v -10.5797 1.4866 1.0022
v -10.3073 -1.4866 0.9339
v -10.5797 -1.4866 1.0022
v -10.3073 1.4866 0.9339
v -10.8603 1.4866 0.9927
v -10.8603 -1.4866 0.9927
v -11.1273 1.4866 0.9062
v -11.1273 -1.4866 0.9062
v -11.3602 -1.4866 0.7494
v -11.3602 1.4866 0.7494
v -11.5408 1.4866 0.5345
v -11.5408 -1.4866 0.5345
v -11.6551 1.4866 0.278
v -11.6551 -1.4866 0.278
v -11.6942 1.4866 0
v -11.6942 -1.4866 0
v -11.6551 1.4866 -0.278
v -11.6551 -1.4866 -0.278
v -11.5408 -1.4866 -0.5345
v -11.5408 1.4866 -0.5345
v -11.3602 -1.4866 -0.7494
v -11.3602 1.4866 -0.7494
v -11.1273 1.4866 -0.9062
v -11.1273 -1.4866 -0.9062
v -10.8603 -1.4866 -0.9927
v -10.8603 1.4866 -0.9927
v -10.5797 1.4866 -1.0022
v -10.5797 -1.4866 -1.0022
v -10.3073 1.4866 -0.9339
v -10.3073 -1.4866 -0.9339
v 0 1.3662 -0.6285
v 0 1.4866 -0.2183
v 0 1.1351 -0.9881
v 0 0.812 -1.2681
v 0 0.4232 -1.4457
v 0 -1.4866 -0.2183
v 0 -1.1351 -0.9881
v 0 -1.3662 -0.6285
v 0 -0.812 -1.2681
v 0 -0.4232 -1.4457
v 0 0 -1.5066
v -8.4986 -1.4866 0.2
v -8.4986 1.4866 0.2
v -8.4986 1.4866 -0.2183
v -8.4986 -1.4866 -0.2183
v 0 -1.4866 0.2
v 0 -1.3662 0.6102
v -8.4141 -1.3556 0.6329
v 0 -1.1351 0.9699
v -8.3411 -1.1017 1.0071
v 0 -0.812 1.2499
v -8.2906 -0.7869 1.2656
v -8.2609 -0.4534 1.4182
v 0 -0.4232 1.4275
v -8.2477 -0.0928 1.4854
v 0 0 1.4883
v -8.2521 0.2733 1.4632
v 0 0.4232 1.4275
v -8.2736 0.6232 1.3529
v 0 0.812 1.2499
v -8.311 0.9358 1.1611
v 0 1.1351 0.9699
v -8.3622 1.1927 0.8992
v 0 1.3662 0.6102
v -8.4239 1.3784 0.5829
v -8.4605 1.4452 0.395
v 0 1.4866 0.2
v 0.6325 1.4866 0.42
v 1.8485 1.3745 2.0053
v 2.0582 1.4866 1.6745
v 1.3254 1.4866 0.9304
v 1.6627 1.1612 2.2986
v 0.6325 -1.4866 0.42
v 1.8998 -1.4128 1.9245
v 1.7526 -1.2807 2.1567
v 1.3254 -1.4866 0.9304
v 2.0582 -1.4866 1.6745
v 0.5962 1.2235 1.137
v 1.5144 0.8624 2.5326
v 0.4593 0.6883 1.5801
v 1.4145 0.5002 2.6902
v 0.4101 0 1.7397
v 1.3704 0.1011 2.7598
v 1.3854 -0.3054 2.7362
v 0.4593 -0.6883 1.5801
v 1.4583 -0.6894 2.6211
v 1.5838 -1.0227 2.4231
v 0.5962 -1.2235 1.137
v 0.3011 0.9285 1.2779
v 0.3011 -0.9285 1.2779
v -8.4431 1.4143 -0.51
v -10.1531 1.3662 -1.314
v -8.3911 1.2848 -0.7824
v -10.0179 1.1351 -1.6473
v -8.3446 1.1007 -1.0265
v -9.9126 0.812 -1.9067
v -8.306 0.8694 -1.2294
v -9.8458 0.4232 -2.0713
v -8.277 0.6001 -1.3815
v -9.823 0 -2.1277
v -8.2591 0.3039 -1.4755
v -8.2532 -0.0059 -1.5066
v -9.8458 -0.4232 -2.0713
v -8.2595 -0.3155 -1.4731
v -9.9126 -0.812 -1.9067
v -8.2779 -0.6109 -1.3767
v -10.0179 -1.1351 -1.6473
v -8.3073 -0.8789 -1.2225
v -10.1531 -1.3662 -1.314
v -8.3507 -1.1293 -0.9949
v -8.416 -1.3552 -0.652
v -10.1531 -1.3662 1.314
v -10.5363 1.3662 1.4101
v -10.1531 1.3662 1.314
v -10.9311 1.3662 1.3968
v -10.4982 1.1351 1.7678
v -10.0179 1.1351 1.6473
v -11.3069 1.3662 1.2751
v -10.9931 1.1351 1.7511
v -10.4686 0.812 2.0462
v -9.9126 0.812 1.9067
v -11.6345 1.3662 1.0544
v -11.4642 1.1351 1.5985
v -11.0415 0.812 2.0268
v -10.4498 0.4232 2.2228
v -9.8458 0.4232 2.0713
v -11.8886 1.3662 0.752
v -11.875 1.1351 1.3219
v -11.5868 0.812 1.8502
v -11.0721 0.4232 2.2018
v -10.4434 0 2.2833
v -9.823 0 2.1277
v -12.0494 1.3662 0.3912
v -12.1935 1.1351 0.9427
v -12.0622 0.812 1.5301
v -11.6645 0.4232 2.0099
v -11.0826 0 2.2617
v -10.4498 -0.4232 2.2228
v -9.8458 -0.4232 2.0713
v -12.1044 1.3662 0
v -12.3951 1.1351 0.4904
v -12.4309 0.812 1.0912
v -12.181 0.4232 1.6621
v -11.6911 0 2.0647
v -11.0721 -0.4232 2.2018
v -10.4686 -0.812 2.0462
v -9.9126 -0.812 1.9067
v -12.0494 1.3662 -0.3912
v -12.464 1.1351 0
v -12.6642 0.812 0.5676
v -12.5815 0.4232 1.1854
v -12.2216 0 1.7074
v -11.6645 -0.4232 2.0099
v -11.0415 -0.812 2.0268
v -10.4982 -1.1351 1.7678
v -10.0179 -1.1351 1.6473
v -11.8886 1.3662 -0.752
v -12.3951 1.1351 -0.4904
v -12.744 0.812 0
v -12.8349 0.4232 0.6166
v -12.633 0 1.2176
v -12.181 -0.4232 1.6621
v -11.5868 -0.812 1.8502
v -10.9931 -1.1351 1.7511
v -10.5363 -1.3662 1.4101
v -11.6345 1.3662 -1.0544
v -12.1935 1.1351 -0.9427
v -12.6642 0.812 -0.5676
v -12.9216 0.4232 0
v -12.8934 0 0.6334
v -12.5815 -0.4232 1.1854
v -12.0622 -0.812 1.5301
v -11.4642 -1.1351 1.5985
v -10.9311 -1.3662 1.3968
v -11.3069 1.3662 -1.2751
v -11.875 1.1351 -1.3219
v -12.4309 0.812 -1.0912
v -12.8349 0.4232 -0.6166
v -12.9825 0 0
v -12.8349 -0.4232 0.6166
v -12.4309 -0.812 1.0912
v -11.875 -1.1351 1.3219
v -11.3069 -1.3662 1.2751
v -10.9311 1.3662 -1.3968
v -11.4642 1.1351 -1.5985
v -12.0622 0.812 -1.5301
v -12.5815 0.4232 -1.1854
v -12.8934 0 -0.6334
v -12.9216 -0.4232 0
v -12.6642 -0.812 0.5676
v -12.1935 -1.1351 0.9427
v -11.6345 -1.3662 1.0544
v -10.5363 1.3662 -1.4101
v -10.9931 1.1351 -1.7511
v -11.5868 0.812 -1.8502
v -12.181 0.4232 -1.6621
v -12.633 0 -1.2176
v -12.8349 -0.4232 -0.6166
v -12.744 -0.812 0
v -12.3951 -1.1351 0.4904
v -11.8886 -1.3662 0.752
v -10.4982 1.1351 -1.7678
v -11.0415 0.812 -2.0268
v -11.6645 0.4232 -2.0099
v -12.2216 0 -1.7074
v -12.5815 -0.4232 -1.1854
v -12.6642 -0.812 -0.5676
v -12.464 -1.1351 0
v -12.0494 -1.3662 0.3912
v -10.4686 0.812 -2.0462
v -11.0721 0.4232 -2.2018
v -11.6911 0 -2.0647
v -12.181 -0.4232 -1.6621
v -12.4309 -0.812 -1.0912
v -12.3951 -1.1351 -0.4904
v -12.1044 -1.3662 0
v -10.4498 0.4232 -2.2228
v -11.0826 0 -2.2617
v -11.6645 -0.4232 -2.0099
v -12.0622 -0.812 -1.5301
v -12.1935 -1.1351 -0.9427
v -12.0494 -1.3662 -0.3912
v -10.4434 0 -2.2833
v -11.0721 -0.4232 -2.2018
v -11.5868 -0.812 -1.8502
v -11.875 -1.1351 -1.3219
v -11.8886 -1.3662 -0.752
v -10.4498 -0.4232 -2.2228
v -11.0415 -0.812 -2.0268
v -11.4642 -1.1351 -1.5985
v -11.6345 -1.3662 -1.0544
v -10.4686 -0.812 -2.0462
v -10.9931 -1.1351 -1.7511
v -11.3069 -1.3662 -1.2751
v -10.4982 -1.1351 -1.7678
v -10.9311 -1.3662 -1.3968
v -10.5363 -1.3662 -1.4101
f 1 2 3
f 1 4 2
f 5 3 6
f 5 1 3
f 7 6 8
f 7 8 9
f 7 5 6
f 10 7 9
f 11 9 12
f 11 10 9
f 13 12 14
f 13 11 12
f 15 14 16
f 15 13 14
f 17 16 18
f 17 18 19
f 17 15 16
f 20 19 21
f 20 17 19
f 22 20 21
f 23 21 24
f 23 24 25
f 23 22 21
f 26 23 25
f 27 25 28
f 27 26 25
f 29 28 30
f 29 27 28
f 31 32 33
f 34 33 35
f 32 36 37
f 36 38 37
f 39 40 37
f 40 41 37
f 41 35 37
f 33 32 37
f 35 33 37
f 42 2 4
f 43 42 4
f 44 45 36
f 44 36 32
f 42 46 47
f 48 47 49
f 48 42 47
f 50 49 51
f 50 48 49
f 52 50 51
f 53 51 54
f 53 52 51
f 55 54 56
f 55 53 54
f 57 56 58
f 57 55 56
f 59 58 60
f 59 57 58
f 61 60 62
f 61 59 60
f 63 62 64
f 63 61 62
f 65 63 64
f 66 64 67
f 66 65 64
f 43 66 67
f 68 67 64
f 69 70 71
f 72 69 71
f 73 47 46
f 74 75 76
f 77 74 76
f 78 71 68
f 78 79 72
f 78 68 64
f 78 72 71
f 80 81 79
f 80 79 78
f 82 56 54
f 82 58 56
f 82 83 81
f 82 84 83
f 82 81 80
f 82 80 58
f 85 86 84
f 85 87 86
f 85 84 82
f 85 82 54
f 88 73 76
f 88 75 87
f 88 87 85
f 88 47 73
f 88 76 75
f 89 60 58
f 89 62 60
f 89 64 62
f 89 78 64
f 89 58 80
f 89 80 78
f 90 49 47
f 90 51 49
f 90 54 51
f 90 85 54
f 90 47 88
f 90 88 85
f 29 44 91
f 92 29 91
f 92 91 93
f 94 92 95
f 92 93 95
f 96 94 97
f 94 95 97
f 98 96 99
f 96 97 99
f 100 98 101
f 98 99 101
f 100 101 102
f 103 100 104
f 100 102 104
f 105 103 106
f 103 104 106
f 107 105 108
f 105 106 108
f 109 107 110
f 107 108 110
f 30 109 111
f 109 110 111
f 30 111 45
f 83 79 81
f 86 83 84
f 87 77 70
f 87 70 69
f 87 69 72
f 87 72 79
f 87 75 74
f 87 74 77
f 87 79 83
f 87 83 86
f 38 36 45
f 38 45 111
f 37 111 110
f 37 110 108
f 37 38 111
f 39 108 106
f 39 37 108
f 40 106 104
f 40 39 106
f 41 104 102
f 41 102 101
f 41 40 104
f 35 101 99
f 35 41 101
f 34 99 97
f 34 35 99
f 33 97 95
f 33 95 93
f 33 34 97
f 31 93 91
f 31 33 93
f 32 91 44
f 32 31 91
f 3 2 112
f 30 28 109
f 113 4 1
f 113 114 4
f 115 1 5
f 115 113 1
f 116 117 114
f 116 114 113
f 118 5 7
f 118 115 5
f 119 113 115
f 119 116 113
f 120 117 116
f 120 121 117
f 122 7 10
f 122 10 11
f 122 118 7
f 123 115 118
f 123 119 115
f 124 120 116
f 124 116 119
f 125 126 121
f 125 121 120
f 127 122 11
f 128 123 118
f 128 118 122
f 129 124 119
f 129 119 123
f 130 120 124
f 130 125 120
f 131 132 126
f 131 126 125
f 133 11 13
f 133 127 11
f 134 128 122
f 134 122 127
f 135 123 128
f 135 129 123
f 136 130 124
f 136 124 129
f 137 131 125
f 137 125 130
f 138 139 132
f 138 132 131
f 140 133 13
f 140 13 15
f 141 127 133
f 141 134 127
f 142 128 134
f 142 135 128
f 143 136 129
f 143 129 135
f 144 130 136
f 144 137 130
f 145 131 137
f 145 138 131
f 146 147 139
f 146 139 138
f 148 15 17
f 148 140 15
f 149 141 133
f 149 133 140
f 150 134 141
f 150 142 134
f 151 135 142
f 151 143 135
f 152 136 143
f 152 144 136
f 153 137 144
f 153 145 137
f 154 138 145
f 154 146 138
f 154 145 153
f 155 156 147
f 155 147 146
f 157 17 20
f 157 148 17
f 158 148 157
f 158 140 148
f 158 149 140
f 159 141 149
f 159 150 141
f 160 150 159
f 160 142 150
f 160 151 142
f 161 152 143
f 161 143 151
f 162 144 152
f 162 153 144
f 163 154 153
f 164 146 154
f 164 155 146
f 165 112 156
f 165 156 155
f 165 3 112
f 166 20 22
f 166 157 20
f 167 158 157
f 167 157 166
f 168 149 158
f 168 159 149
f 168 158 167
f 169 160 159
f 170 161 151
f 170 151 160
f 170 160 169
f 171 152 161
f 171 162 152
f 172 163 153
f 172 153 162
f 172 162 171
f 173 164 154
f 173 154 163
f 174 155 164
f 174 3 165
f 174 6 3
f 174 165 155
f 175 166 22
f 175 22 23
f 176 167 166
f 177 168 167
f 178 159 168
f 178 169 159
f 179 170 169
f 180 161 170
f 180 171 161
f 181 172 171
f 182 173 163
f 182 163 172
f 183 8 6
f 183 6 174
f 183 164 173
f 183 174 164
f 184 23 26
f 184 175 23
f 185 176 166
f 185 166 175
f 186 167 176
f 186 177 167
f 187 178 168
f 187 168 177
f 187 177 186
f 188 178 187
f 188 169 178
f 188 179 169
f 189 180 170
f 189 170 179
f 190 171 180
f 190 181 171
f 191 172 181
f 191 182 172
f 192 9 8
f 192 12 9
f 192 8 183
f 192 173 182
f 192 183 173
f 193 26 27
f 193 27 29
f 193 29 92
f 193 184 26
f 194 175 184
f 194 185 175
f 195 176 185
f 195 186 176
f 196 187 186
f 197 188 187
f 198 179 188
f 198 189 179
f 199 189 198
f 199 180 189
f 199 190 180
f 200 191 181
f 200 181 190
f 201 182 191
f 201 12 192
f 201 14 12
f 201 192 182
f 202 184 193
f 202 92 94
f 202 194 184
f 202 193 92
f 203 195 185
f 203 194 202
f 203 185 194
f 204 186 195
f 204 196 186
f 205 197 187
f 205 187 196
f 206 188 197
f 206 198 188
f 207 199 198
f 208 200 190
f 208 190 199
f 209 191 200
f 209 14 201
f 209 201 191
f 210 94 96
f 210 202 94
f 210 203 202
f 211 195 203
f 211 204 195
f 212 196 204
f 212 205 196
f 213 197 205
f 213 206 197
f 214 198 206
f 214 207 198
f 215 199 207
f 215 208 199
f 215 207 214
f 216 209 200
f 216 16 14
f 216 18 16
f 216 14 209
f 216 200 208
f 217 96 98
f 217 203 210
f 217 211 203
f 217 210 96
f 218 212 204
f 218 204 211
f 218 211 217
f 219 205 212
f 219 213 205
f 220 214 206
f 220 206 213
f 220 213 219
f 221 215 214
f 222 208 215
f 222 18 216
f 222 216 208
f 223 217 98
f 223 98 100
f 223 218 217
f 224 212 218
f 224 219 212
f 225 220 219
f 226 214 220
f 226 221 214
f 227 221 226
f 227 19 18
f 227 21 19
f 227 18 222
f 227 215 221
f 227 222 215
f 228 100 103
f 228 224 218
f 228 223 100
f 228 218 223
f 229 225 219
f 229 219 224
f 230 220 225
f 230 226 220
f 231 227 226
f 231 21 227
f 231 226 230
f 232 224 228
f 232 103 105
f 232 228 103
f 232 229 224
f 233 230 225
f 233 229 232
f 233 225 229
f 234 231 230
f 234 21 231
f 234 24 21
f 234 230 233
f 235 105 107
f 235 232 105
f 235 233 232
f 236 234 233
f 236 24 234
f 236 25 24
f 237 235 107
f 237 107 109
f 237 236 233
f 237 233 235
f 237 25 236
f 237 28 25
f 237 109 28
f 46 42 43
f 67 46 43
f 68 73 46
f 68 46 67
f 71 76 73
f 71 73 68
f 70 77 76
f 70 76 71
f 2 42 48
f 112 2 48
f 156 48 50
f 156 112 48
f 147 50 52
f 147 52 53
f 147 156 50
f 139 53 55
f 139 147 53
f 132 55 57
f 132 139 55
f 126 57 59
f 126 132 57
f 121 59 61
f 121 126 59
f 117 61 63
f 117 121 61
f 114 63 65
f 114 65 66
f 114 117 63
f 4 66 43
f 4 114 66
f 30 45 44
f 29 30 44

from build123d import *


with BuildPart() as f2:
    # F2: sweep along a path in F1
    with BuildLine(Plane.XZ) as f2_path:
        Line((0, 0.1928703859), (-8.5, 0.1928703859))
        Line((-8.5, 0.1928703859), (-10.310026817, 0.9273105534))
        ThreePointArc((-10.310026817, 0.9273105534), (-11.6870349777, 0), (-10.310026817, -0.9273105534))
        Line((-10.310026817, -0.9273105534), (-8.5, -0.2111324798))
        Line((-8.5, -0.2111324798), (0, -0.2111324798))
    # F0 (on Right) → F2 (sweep)
    with BuildSketch(Plane.YZ):
        with BuildLine():
            Line((-1.4866068747, 0.2), (1.4866068747, 0.2))
            ThreePointArc((1.4866068747, 0.2), (0, 1.4883123163), (-1.4866068747, 0.2))
        make_face()
    sweep(path=f2_path.line, transition=Transition.RIGHT)

    # F3: sweep along a path in F1
    with BuildLine(Plane.XZ) as f3_path:
        add(Plane.XZ * Edge.make_bspline(
            [(0, 0.1928703859), (0.2573332154, 0.260272227), (0.8780881589, 0.4261663517), (1.6328392869, 1.207547598), (2.0620173309, 1.6684386646)],
            knots=[0, 0, 0, 0, 0.4125710277, 1, 1, 1, 1], degree=3))
    # F0 (on Right) → F3 (sweep)
    with BuildSketch(Plane.YZ):
        with BuildLine():
            Line((-1.4866068747, 0.2), (1.4866068747, 0.2))
            ThreePointArc((1.4866068747, 0.2), (0, 1.4883123163), (-1.4866068747, 0.2))
        make_face()
    sweep(path=f3_path.line)


solid = f2.part
